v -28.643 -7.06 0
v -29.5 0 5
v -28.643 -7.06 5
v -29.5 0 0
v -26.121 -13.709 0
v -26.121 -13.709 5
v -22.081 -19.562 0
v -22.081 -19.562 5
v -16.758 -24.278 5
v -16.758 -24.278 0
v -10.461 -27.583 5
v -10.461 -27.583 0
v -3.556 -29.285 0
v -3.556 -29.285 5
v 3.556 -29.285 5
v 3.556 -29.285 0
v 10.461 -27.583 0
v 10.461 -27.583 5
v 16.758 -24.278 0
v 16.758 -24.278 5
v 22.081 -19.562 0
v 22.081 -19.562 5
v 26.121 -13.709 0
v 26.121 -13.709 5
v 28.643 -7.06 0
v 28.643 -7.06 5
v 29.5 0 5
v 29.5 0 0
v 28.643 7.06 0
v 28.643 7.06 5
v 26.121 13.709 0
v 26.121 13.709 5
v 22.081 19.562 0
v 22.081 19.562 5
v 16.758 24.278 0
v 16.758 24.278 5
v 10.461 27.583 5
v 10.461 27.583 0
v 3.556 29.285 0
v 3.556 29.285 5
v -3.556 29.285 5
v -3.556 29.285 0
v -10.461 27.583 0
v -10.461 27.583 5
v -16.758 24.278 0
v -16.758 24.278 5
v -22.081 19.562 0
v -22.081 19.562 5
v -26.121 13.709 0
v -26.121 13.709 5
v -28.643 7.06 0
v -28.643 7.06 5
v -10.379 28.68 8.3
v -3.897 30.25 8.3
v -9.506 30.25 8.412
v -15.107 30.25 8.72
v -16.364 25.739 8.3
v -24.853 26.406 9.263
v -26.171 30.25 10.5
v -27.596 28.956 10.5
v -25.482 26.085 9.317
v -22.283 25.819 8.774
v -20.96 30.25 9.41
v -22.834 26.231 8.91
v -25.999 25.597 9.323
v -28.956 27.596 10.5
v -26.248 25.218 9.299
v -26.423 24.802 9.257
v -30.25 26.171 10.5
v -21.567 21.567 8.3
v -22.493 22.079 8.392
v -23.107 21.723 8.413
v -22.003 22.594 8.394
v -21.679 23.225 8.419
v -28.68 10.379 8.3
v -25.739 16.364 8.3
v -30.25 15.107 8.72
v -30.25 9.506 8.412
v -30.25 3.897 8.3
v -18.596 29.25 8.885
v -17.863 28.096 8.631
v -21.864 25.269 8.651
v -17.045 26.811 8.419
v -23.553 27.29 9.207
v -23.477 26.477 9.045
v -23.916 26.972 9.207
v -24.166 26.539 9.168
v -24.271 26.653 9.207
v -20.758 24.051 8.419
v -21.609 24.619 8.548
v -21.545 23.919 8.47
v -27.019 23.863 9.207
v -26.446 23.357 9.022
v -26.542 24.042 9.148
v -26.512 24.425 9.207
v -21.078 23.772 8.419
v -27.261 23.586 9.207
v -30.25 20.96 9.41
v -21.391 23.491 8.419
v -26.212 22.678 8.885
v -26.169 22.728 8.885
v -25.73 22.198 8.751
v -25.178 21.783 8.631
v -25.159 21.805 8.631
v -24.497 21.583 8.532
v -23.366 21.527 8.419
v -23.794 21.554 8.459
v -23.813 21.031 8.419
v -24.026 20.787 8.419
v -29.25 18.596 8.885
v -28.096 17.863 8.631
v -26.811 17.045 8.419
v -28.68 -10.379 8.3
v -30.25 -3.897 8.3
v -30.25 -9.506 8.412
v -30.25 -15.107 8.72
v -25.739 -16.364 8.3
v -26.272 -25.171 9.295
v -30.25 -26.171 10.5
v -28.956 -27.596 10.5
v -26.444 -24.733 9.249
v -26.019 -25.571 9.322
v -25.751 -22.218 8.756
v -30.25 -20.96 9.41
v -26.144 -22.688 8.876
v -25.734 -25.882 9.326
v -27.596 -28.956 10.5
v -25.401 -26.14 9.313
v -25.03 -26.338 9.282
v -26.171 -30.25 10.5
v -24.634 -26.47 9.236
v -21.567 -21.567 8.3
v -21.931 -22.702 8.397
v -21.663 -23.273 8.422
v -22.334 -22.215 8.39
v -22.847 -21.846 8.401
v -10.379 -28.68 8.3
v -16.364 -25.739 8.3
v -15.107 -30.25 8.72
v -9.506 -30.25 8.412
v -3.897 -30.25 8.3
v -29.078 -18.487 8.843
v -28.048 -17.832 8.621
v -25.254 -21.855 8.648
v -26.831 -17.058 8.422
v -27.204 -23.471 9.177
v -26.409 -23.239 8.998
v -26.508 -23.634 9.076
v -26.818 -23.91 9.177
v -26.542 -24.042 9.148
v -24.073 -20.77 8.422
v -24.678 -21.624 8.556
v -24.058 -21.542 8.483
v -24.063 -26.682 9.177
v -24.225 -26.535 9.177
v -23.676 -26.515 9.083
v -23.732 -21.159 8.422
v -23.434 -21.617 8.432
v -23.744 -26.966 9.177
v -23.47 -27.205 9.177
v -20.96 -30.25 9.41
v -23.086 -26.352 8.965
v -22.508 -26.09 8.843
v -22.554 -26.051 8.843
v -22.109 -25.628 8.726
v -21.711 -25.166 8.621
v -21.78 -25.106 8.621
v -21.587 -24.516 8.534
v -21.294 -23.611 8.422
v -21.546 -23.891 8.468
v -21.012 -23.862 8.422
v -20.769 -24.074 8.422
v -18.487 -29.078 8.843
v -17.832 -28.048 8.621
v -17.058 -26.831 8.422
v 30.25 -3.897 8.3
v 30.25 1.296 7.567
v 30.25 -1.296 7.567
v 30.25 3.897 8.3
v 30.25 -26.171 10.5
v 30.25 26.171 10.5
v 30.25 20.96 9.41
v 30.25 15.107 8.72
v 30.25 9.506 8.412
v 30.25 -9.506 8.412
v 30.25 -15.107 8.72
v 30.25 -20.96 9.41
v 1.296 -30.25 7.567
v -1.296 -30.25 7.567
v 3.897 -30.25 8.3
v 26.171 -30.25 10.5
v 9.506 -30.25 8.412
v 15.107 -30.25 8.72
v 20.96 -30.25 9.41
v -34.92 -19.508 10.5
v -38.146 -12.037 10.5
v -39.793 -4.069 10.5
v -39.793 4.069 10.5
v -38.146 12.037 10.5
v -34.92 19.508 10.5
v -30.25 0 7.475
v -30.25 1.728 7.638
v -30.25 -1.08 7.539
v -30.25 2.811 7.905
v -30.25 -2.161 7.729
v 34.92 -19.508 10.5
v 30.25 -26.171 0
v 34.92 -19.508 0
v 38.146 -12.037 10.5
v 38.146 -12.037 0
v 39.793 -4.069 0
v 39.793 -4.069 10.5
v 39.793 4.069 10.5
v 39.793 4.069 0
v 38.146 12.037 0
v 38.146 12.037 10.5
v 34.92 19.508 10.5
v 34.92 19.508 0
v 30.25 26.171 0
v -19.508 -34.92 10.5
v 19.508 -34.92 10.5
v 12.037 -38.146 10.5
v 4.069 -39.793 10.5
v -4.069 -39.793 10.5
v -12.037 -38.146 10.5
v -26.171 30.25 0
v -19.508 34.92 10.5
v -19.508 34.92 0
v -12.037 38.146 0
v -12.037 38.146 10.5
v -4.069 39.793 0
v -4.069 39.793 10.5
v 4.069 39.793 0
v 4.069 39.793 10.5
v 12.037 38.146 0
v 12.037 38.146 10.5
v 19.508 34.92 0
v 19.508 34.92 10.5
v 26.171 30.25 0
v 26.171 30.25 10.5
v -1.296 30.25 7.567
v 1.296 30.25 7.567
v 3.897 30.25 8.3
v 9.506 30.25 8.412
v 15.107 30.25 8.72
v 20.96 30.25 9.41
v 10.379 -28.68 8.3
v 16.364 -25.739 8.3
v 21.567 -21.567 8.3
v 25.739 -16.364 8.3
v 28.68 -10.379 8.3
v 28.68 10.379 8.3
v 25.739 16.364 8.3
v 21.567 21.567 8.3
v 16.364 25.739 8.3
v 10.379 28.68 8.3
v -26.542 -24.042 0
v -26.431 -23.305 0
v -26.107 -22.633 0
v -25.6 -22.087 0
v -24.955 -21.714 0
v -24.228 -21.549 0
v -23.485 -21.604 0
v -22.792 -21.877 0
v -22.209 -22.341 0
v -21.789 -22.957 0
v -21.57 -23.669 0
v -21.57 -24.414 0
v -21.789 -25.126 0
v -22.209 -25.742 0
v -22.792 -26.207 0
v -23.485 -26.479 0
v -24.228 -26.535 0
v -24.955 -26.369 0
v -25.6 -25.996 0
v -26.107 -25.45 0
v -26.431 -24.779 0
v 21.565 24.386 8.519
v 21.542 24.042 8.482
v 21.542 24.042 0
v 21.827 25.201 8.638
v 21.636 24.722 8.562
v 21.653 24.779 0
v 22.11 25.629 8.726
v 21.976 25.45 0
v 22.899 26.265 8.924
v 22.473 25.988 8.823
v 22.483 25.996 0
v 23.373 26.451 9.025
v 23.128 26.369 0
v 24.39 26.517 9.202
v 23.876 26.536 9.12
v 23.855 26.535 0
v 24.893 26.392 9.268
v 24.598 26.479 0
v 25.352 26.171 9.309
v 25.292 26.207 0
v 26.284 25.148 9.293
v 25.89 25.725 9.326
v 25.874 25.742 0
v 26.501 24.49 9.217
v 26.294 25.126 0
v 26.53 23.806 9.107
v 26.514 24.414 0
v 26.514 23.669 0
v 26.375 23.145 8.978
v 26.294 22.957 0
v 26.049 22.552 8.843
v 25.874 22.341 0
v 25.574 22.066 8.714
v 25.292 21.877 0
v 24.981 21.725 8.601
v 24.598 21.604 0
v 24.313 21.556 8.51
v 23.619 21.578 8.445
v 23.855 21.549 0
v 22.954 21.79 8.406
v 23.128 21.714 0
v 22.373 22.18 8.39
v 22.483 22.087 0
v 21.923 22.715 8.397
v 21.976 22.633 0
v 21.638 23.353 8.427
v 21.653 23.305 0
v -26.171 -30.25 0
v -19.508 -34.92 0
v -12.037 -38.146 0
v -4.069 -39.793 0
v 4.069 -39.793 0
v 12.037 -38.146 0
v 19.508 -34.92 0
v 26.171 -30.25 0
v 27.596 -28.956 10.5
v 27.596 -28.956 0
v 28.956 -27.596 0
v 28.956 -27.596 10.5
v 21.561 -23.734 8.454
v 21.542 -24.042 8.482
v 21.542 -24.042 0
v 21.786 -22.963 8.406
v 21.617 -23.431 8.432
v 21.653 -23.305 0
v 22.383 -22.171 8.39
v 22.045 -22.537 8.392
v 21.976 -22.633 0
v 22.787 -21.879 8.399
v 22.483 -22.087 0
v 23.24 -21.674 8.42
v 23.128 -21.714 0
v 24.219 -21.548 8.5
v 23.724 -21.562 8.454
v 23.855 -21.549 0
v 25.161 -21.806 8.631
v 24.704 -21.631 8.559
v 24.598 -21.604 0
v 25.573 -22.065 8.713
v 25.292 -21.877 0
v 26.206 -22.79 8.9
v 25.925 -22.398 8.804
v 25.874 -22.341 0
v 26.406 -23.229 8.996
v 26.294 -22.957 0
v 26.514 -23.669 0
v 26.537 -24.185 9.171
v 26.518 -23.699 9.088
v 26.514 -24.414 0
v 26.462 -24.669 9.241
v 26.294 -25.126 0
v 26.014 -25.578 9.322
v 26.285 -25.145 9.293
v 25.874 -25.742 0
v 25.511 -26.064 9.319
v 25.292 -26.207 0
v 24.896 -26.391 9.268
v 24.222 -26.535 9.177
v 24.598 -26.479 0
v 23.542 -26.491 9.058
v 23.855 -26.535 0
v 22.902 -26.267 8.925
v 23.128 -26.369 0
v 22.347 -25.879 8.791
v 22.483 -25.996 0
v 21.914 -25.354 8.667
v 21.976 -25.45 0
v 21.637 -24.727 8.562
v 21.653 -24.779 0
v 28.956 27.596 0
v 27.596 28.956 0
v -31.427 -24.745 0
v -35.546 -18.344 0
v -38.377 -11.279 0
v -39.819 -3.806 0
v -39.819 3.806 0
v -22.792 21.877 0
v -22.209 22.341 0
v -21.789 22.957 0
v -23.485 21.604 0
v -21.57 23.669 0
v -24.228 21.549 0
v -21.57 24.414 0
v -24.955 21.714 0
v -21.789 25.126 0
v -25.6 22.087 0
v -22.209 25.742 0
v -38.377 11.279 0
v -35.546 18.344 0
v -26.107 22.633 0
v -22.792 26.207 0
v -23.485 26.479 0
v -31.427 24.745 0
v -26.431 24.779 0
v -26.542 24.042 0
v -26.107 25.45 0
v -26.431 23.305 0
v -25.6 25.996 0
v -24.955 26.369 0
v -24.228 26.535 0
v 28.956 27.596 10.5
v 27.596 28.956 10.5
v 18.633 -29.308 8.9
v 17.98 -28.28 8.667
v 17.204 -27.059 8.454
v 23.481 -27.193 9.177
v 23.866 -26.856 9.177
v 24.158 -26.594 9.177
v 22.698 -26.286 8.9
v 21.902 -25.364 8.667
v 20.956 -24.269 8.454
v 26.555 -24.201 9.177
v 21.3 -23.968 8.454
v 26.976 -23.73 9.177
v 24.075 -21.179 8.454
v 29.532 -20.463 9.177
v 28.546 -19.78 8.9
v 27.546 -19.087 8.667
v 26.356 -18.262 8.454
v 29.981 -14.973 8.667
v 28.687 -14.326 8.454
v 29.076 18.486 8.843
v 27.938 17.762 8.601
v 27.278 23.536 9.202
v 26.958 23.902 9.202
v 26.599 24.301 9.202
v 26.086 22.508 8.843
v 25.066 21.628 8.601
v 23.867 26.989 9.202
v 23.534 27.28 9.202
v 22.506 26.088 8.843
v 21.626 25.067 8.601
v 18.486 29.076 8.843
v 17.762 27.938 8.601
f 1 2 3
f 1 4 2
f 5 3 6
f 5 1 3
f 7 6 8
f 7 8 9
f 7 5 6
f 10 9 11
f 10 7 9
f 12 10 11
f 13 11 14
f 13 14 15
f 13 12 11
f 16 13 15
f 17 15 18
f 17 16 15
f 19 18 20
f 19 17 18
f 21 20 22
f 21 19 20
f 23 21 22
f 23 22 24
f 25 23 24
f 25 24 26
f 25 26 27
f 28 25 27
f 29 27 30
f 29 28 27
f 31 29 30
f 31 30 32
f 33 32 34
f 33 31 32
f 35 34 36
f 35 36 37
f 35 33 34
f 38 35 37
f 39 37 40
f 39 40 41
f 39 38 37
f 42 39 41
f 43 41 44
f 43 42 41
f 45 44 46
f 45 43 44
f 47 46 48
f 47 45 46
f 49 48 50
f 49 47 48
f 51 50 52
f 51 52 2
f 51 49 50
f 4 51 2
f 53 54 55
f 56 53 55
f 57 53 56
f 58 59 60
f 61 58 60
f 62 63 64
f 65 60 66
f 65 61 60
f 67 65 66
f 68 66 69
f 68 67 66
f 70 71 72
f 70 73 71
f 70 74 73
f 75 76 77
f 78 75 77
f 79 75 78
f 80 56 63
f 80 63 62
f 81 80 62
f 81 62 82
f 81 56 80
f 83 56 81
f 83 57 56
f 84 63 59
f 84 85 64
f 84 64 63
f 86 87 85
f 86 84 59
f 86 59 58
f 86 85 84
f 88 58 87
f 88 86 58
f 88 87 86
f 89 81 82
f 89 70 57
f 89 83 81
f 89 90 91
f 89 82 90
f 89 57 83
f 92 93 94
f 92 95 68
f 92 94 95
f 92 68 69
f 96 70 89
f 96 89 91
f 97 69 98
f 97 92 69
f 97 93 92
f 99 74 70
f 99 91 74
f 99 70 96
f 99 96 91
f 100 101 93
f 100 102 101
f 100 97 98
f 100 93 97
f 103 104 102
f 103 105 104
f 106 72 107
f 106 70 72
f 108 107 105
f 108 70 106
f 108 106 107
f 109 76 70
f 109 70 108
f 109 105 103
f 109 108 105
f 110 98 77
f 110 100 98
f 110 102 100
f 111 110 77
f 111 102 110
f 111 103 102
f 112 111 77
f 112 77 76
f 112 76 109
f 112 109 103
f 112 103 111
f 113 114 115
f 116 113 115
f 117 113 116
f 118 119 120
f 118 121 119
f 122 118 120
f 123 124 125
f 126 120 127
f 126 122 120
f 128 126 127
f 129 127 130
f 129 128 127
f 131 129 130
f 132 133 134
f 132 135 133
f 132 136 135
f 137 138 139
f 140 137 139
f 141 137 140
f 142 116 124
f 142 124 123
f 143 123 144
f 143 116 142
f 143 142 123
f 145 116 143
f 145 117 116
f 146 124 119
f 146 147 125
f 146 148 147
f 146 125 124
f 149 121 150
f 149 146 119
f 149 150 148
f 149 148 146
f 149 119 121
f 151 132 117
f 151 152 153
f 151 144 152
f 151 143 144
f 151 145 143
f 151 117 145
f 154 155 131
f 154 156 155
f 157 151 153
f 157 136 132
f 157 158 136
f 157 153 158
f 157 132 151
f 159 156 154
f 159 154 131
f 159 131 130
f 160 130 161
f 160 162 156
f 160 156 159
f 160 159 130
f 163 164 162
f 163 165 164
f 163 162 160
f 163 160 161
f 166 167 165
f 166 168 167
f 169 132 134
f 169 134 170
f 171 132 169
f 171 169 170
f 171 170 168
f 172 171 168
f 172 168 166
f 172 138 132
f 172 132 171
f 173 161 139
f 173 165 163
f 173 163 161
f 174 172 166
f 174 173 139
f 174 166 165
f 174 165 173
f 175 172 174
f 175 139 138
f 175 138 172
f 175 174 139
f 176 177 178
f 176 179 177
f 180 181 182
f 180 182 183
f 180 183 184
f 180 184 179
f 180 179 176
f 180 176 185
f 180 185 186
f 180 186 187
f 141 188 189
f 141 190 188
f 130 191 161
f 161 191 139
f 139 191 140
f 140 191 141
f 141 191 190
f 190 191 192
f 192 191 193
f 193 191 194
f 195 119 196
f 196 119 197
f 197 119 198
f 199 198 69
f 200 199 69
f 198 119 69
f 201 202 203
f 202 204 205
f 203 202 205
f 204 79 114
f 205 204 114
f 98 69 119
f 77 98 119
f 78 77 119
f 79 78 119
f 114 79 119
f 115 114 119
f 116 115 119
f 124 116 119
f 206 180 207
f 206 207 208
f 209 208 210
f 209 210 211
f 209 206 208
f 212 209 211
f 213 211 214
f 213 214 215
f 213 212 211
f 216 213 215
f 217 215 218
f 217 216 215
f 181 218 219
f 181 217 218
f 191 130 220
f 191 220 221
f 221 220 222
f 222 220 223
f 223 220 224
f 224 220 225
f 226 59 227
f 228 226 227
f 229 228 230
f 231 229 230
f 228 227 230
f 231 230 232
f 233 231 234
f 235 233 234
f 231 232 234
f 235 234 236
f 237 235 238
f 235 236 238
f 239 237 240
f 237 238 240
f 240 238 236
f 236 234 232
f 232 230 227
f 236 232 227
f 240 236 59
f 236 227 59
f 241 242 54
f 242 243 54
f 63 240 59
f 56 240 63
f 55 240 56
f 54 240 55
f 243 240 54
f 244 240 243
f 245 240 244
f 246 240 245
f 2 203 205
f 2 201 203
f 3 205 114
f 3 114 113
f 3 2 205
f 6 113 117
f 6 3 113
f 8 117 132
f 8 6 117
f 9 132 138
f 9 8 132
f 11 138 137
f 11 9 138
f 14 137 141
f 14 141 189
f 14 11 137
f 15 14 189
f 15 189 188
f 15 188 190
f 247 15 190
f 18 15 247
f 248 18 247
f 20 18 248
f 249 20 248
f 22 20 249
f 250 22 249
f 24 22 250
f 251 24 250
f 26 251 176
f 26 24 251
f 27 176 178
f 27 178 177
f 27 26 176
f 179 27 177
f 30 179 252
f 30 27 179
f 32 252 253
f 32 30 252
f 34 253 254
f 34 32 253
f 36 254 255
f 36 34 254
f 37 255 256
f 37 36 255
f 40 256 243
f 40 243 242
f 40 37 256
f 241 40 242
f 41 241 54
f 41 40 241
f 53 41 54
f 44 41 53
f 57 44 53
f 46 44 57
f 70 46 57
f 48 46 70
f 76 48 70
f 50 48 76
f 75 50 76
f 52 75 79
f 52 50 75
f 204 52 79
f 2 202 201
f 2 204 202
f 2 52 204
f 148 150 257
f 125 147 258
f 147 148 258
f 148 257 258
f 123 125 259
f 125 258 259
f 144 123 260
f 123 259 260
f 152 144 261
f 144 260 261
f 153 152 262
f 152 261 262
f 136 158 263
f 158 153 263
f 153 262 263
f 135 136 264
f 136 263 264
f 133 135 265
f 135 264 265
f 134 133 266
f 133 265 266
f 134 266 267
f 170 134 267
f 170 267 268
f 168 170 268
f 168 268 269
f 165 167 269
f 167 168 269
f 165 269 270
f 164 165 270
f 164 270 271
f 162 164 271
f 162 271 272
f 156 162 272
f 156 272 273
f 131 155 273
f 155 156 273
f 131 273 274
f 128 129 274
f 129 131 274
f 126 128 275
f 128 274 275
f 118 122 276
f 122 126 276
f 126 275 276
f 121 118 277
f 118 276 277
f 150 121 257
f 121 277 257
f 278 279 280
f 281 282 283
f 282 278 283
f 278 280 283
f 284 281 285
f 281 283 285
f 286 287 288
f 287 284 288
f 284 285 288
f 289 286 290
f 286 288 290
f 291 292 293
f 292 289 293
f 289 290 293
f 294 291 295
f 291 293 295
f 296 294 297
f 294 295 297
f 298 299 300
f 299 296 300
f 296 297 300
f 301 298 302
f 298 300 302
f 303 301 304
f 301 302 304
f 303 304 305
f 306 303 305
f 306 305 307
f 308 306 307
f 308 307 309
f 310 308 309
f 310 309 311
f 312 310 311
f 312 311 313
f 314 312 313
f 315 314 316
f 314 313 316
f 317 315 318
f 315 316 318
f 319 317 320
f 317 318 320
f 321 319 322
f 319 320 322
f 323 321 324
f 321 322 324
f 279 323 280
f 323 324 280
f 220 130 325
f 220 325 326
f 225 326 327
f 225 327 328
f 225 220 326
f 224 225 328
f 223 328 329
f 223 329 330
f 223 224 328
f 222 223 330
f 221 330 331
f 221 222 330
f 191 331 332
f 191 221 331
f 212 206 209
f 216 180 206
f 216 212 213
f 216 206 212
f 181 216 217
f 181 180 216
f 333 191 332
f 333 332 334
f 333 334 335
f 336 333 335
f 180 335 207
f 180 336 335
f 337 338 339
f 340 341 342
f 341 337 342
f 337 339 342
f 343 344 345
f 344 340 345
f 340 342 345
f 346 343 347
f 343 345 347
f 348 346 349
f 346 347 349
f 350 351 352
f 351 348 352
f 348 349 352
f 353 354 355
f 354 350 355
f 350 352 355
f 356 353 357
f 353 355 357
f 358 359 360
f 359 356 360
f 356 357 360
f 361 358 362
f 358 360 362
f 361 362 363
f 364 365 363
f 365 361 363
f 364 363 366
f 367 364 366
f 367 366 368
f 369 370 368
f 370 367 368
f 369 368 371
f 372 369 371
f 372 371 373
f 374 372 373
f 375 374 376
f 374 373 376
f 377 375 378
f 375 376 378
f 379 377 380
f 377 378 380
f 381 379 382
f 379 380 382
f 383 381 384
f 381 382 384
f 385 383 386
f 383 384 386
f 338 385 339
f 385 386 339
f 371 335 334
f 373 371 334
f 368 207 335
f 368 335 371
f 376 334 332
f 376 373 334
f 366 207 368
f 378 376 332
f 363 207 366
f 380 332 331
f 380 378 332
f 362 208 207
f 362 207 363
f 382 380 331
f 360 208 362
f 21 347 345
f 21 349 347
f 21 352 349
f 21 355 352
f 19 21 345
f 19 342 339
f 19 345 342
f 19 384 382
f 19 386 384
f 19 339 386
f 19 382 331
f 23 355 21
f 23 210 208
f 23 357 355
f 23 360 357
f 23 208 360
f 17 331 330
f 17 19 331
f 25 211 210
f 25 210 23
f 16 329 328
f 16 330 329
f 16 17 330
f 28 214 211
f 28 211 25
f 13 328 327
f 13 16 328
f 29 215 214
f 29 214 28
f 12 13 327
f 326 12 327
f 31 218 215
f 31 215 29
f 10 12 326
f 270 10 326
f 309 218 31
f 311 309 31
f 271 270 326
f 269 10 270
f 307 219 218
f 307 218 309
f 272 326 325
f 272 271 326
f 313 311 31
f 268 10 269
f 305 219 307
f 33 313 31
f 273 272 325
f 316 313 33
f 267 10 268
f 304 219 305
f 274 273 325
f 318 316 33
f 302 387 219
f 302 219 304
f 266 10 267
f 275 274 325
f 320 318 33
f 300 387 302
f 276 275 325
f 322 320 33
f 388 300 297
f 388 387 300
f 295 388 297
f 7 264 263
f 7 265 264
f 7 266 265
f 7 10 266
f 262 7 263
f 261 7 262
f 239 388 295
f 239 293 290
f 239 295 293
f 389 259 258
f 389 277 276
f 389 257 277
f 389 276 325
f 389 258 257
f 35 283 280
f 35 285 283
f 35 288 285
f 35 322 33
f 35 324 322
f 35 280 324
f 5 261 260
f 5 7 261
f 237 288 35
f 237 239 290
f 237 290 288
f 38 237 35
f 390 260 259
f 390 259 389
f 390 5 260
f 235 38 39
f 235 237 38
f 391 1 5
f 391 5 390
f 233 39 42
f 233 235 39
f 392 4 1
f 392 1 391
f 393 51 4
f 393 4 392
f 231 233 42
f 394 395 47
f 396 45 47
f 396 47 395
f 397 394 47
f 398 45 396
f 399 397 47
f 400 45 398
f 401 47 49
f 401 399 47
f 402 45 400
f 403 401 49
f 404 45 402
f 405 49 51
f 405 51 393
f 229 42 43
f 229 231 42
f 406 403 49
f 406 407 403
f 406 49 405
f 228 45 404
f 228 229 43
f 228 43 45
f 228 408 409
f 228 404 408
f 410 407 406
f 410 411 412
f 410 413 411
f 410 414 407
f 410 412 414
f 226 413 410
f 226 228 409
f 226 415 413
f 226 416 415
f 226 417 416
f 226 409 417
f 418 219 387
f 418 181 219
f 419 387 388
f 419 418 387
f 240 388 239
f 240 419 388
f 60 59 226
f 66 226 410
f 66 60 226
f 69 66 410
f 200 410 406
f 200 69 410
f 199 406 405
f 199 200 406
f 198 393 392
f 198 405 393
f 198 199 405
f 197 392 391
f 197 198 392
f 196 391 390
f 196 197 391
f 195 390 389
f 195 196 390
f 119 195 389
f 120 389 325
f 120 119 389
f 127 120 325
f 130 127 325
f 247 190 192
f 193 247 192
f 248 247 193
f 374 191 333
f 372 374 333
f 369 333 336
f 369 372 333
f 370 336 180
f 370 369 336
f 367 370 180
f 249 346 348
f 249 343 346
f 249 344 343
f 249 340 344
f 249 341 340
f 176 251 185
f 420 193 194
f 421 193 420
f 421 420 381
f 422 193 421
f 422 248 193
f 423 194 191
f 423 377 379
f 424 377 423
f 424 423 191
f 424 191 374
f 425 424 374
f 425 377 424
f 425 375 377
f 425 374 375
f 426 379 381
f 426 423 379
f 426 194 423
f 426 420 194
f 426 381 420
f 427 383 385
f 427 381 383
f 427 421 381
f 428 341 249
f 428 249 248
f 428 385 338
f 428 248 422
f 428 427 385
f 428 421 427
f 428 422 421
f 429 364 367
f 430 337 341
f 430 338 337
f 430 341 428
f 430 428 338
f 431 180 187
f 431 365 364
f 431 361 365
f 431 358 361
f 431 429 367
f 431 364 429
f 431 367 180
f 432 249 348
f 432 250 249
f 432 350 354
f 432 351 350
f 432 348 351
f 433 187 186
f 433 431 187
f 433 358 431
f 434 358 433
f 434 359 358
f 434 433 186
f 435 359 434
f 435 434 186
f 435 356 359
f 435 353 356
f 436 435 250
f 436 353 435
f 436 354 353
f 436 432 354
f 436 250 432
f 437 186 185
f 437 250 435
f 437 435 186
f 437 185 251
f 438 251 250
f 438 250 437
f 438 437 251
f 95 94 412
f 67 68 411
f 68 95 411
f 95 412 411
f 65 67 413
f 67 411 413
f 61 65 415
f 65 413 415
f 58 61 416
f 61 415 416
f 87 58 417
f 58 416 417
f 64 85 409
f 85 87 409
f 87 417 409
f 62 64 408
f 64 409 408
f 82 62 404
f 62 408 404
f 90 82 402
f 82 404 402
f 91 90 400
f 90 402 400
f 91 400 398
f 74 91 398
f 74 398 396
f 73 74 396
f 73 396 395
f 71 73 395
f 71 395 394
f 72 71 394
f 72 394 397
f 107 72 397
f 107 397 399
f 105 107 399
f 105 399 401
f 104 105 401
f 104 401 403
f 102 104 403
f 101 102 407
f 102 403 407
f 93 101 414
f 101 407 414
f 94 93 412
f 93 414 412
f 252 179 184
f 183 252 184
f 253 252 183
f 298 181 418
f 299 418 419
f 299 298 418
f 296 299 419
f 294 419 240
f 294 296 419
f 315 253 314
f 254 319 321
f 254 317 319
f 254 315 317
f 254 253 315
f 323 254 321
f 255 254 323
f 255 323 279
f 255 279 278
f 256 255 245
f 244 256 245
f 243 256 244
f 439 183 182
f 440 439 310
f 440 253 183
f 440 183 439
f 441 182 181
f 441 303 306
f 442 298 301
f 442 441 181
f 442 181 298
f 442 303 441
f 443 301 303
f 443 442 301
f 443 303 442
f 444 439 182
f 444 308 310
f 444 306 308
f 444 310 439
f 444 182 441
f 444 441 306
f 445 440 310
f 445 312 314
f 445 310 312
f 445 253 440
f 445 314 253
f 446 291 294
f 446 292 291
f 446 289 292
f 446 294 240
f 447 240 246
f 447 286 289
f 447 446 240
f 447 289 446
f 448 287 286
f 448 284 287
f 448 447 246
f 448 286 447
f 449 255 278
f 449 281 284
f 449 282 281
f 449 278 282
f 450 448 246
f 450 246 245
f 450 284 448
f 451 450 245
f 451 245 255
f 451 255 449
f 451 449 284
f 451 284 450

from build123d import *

# Parameters (mm, degrees)
SKETCH2_R           = 2.5
CUT_EXTRUDE2_DEPTH  = 58.534772252
BOSS_EXTRUDE1_START = -10.5
BOSS_EXTRUDE1_DEPTH = 10.5


with BuildPart() as part:
    # Sketch1 → Revolve1 (revolve)
    with BuildSketch(Plane(origin=(0, 0, 0), x_dir=(1, 0, 0), z_dir=(0, 1, 0)), mode=Mode.PRIVATE) as revolve1_sk:
        with BuildLine():
            Line((29.5, 0), (40, 0))
            Line((40, 0), (40, -10.5))
            ThreePointArc((40, -10.5), (35.334867618, -9.033526194), (30.5, -8.3))
            Line((30.5, -8.3), (29.5, -5))
            Line((29.5, -5), (29.5, 0))
        make_face()
    revolve(revolve1_sk.sketch.rotate(Axis((0, 0, 0), (0, 0, 1)), 180), axis=Axis((0, 0, 0), (0, 0, 1)))

    # Sketch2 → Cut-Extrude2 (cut, through all)
    with BuildSketch(Plane(origin=(0, 0, 0), x_dir=(-1, 0, 0), z_dir=(0, 0, -1))):
        with Locations((24.04163056, 24.04163056)):
            Circle(SKETCH2_R)
        with Locations((24.04163056, -24.04163056)):
            Circle(SKETCH2_R)
        with Locations((-24.04163056, -24.04163056)):
            Circle(SKETCH2_R)
        with Locations((-24.04163056, 24.04163056)):
            Circle(SKETCH2_R)
    extrude(amount=-CUT_EXTRUDE2_DEPTH, mode=Mode.SUBTRACT)

    # Sketch4 → Boss-Extrude1 (add)
    with BuildSketch(Plane(origin=(0, 0, 0), x_dir=(-1, 0, 0), z_dir=(0, 0, -1)).offset(BOSS_EXTRUDE1_START)):
        with BuildLine():
            Line((-26.171310628, 30.25), (26.171310628, 30.25))
            ThreePointArc((26.171310628, 30.25), (0, 40), (-26.171310628, 30.25))
        make_face()
        with BuildLine():
            Line((-30.25, 26.171310628), (-30.25, -26.171310628))
            ThreePointArc((-30.25, -26.171310628), (-40, 0), (-30.25, 26.171310628))
        make_face()
        with BuildLine():
            Line((-26.171310628, -30.25), (26.171310628, -30.25))
            ThreePointArc((26.171310628, -30.25), (0, -40), (-26.171310628, -30.25))
        make_face()
        with BuildLine():
            Line((30.25, 26.171310628), (30.25, -26.171310628))
            ThreePointArc((30.25, -26.171310628), (40, 0), (30.25, 26.171310628))
        make_face()
    extrude(amount=BOSS_EXTRUDE1_DEPTH)


solid = part.part
